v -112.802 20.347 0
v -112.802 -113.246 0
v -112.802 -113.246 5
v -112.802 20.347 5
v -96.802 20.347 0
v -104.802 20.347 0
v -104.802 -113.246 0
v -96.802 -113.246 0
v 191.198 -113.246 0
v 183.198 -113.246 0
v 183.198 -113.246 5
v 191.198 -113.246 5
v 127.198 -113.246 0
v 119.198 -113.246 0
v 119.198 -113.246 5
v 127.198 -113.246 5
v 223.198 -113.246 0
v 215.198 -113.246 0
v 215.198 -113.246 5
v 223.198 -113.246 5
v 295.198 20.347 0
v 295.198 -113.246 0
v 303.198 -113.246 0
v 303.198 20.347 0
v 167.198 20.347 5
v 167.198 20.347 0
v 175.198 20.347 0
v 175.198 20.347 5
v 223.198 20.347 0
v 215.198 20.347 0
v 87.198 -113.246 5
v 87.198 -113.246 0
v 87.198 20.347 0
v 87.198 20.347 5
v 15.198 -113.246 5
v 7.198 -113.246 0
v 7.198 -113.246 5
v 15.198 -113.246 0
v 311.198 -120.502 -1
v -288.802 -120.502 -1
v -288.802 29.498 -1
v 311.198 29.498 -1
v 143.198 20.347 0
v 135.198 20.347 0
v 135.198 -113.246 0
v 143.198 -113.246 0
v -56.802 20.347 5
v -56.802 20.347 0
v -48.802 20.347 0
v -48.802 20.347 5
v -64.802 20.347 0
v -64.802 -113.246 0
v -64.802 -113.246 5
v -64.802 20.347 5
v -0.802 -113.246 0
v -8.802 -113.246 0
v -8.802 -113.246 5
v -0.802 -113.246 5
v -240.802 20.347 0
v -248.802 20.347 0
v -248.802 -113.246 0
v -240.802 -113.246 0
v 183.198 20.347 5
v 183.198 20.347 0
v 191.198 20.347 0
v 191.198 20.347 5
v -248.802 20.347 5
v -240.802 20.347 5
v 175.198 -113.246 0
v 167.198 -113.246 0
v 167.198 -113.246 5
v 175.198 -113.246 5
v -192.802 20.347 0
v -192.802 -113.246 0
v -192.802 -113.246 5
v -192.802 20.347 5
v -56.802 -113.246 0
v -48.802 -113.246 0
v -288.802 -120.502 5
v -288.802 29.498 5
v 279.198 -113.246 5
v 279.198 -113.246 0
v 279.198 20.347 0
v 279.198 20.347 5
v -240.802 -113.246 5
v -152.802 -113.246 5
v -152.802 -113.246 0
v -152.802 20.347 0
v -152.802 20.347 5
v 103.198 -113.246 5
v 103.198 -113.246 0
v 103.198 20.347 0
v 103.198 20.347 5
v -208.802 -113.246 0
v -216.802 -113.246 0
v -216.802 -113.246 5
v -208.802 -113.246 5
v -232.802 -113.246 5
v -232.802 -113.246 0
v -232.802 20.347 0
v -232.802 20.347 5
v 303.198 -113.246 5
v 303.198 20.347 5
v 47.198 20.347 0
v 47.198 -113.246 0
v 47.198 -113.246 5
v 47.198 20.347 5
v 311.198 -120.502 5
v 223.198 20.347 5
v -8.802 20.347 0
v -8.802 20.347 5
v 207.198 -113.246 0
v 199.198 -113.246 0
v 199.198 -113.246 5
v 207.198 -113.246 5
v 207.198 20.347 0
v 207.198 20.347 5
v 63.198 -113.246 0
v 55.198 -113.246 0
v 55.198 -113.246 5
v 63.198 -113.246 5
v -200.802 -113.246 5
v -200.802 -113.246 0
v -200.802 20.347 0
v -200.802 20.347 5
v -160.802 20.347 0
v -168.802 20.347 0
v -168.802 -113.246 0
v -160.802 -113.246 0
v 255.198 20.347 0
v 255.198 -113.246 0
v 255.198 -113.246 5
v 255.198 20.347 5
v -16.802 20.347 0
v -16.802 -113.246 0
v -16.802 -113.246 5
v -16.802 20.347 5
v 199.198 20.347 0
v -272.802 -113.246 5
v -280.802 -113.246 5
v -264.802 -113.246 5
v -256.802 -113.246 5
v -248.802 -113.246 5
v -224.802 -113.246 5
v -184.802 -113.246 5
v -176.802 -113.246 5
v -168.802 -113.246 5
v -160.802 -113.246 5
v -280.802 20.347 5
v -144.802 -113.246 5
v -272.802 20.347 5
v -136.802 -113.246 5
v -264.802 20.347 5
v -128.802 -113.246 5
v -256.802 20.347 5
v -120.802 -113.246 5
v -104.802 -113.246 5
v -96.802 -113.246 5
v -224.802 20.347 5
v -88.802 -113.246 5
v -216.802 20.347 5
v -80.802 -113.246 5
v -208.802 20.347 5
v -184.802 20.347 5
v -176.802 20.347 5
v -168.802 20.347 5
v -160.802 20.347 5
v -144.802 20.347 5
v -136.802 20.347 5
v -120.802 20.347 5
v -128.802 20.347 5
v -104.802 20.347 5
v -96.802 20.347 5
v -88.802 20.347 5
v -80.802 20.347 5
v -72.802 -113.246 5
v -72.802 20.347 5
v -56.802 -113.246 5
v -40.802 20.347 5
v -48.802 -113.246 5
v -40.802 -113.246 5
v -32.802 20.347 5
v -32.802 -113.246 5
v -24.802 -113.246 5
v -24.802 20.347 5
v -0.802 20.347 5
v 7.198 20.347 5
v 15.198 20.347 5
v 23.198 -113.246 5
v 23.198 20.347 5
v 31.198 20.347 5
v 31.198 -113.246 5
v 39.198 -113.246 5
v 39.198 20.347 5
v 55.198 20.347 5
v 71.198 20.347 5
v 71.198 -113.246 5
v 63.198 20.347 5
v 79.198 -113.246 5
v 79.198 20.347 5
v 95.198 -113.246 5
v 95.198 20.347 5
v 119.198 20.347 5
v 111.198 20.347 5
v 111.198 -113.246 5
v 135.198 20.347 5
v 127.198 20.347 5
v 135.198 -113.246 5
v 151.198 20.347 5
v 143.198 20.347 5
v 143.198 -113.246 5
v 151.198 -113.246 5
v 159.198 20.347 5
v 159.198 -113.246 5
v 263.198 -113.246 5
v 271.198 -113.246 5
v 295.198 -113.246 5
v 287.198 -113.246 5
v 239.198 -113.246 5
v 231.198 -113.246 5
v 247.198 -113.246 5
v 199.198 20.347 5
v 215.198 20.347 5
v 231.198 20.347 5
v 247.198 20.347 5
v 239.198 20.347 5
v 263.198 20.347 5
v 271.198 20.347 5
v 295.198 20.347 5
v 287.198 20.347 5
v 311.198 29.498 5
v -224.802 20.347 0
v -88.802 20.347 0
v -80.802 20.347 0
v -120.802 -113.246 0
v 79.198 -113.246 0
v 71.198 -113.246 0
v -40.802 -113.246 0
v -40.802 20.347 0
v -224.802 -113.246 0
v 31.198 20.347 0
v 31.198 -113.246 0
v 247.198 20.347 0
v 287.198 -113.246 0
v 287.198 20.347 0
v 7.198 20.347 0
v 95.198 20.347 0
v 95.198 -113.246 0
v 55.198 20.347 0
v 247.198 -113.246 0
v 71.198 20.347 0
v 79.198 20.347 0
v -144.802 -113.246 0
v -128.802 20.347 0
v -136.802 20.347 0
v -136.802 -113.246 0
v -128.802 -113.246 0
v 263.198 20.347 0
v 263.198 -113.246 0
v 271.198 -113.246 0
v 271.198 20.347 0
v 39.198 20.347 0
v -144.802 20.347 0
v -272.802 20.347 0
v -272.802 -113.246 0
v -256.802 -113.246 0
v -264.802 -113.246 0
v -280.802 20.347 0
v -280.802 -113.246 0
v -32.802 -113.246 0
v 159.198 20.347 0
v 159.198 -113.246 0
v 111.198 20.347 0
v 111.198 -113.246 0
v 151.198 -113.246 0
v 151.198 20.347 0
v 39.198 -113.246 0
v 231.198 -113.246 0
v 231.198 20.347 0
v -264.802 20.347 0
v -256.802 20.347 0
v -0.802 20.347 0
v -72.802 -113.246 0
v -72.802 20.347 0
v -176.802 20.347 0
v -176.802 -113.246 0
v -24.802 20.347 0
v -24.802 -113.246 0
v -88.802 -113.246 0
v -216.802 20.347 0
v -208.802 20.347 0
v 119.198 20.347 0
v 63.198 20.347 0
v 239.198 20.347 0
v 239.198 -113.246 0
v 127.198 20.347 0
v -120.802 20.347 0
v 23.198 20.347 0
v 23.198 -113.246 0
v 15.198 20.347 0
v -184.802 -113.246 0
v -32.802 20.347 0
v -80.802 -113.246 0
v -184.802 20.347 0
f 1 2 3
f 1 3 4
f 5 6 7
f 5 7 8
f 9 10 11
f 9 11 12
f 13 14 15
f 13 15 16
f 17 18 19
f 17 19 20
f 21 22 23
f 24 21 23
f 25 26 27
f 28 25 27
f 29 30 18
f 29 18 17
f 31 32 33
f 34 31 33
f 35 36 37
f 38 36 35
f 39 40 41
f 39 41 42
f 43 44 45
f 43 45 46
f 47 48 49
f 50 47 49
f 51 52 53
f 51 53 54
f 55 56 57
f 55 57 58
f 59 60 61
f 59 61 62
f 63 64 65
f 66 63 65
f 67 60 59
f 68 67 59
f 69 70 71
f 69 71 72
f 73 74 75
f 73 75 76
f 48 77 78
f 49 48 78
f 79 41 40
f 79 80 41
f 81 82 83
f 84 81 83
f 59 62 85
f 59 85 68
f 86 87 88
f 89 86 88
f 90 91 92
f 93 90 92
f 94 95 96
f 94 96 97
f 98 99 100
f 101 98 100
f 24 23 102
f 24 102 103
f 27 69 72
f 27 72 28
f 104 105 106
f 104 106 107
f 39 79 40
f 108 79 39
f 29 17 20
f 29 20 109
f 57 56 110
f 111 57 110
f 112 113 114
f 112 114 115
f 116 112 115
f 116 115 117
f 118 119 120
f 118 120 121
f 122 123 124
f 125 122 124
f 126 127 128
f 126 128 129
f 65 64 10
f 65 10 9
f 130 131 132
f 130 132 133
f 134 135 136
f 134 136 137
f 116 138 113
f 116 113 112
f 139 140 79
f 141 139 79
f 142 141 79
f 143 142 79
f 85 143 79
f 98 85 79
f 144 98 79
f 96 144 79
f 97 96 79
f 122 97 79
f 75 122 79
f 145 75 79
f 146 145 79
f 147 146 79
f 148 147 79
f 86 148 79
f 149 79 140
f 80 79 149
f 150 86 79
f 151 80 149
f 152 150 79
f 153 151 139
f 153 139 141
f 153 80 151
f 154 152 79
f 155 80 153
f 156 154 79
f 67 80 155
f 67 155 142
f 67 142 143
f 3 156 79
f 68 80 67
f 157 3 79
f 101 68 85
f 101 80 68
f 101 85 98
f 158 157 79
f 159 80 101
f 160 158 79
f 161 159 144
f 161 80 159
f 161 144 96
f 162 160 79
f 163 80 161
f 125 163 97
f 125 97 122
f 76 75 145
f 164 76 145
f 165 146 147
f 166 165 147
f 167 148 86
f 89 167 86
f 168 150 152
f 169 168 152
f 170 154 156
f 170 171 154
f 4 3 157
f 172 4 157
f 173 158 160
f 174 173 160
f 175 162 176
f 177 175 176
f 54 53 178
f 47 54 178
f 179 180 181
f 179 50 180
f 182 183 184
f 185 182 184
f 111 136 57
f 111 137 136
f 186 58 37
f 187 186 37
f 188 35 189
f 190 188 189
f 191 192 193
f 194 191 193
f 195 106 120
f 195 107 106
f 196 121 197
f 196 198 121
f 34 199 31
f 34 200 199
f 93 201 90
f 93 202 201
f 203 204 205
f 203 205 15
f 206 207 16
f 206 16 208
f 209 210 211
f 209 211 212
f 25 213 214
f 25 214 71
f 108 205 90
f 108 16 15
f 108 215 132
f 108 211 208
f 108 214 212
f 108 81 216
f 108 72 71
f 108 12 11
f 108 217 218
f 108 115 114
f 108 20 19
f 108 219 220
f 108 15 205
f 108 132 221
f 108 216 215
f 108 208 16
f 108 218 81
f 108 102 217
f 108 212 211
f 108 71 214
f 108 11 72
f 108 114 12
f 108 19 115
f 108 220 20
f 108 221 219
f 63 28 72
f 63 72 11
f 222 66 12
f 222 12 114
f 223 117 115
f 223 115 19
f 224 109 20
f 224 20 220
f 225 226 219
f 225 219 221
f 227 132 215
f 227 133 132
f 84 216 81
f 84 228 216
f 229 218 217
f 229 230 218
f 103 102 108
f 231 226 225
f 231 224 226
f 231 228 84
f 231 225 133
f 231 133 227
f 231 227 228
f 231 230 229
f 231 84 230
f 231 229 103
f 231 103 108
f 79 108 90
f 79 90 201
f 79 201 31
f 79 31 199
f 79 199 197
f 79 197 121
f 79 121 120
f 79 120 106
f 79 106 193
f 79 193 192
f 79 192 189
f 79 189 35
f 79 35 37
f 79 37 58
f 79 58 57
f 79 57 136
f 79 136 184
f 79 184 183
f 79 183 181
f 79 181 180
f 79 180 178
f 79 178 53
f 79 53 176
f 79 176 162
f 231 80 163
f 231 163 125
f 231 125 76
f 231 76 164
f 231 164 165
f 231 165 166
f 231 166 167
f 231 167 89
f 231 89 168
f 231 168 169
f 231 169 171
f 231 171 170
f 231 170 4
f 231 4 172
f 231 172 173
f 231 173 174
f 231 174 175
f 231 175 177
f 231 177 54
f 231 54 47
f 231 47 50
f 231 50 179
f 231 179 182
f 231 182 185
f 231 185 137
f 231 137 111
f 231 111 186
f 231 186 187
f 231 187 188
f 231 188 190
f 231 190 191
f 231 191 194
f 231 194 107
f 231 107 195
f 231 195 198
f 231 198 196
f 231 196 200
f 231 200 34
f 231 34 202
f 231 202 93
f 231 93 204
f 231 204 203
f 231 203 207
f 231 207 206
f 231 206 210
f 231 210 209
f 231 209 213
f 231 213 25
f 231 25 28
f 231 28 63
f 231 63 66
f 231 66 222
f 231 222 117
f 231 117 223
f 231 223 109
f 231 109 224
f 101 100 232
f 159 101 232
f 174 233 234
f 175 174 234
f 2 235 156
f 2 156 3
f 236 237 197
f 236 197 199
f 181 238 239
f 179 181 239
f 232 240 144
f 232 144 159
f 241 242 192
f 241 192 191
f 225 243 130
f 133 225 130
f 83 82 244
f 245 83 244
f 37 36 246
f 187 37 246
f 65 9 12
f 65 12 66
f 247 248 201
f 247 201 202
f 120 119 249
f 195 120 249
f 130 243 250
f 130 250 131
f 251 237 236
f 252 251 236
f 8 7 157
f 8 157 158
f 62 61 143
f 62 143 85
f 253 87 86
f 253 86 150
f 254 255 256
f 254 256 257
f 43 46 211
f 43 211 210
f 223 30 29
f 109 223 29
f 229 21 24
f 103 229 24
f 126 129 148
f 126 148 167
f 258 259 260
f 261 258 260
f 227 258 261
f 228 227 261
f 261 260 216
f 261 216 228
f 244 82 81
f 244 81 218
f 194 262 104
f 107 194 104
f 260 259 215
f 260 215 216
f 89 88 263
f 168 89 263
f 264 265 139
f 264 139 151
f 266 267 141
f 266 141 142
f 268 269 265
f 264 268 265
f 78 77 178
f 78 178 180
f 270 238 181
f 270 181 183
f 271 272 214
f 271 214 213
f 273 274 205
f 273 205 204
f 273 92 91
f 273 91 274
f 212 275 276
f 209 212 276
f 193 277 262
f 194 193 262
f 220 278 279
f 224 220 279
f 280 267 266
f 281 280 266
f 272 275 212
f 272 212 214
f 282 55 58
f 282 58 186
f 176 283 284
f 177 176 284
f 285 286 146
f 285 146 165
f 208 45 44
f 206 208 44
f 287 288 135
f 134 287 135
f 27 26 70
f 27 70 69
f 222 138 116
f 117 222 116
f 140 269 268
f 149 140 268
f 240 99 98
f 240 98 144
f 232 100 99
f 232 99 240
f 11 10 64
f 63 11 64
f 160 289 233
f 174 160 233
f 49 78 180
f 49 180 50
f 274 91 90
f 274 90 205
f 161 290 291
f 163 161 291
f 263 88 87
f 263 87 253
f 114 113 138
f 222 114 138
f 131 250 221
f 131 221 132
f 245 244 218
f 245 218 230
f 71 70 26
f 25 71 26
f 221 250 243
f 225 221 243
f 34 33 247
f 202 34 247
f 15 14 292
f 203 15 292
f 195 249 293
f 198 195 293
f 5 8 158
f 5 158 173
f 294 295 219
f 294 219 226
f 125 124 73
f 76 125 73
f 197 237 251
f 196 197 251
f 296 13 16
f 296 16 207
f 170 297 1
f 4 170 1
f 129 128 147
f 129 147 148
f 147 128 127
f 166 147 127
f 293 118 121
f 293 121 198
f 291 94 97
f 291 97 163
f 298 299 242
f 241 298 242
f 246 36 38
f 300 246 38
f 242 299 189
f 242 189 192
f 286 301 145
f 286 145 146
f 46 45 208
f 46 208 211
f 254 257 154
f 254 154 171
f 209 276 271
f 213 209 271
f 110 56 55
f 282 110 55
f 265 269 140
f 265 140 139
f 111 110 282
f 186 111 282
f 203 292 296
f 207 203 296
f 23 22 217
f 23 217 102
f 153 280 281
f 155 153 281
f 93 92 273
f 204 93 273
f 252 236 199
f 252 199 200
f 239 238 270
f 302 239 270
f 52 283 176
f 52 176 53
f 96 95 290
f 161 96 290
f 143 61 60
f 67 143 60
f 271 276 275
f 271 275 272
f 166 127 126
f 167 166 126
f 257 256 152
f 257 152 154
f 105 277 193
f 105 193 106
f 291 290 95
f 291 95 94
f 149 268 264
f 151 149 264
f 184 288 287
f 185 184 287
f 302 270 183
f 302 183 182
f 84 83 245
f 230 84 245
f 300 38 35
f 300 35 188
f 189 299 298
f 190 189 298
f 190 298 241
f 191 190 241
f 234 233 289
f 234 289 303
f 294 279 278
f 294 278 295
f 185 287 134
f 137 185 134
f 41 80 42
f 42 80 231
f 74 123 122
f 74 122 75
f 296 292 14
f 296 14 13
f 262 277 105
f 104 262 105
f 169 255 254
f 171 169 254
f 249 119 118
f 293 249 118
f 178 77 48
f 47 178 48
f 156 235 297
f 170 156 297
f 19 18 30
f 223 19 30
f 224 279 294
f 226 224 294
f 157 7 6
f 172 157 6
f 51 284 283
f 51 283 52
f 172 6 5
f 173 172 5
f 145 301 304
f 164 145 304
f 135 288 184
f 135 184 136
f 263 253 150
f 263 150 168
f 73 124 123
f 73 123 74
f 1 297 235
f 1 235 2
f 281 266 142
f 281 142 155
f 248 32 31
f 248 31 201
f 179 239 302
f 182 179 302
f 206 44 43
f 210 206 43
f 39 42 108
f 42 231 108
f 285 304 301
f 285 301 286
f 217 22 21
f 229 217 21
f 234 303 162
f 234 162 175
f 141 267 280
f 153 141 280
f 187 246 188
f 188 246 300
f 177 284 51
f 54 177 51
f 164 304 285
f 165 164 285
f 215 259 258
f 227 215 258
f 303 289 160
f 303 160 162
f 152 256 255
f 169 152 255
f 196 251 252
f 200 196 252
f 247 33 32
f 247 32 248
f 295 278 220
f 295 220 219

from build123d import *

# Parameters (mm, degrees)
F0_W     = 600
F0_H     = 150
F0_W_2   = 8
F0_H_2   = 133.593111
F1_DEPTH = 5
F2_W     = 600
F2_H     = 150
F3_DEPTH = 1


with BuildPart() as f1:
    # F0 (on Top) → F1 (new body)
    with BuildSketch(Plane.XY):
        with Locations((11.197913, -45.502181)):
            Rectangle(F0_W, F0_H)
        with Locations((-276.802087, -46.449782)):
            Rectangle(F0_W_2, F0_H_2, mode=Mode.SUBTRACT)
        with Locations((-260.802087, -46.449782)):
            Rectangle(F0_W_2, F0_H_2, mode=Mode.SUBTRACT)
        with Locations((-244.802087, -46.449782)):
            Rectangle(F0_W_2, F0_H_2, mode=Mode.SUBTRACT)
        with Locations((-228.802087, -46.449782)):
            Rectangle(F0_W_2, F0_H_2, mode=Mode.SUBTRACT)
        with Locations((-212.802087, -46.449782)):
            Rectangle(F0_W_2, F0_H_2, mode=Mode.SUBTRACT)
        with Locations((-196.802087, -46.449782)):
            Rectangle(F0_W_2, F0_H_2, mode=Mode.SUBTRACT)
        with Locations((-180.802087, -46.449782)):
            Rectangle(F0_W_2, F0_H_2, mode=Mode.SUBTRACT)
        with Locations((-164.802087, -46.449782)):
            Rectangle(F0_W_2, F0_H_2, mode=Mode.SUBTRACT)
        with Locations((-148.802087, -46.449782)):
            Rectangle(F0_W_2, F0_H_2, mode=Mode.SUBTRACT)
        with Locations((-132.802087, -46.449782)):
            Rectangle(F0_W_2, F0_H_2, mode=Mode.SUBTRACT)
        with Locations((-116.802087, -46.449782)):
            Rectangle(F0_W_2, F0_H_2, mode=Mode.SUBTRACT)
        with Locations((-100.802087, -46.449782)):
            Rectangle(F0_W_2, F0_H_2, mode=Mode.SUBTRACT)
        with Locations((-84.802087, -46.449782)):
            Rectangle(F0_W_2, F0_H_2, mode=Mode.SUBTRACT)
        with Locations((-68.802087, -46.449782)):
            Rectangle(F0_W_2, F0_H_2, mode=Mode.SUBTRACT)
        with Locations((-52.802087, -46.449782)):
            Rectangle(F0_W_2, F0_H_2, mode=Mode.SUBTRACT)
        with Locations((-36.802087, -46.449782)):
            Rectangle(F0_W_2, F0_H_2, mode=Mode.SUBTRACT)
        with Locations((-20.802087, -46.449782)):
            Rectangle(F0_W_2, F0_H_2, mode=Mode.SUBTRACT)
        with Locations((-4.802087, -46.449782)):
            Rectangle(F0_W_2, F0_H_2, mode=Mode.SUBTRACT)
        with Locations((11.197913, -46.449782)):
            Rectangle(F0_W_2, F0_H_2, mode=Mode.SUBTRACT)
        with Locations((27.197913, -46.449782)):
            Rectangle(F0_W_2, F0_H_2, mode=Mode.SUBTRACT)
        with Locations((43.197913, -46.449782)):
            Rectangle(F0_W_2, F0_H_2, mode=Mode.SUBTRACT)
        with Locations((59.197913, -46.449782)):
            Rectangle(F0_W_2, F0_H_2, mode=Mode.SUBTRACT)
        with Locations((75.197913, -46.449782)):
            Rectangle(F0_W_2, F0_H_2, mode=Mode.SUBTRACT)
        with Locations((91.197913, -46.449782)):
            Rectangle(F0_W_2, F0_H_2, mode=Mode.SUBTRACT)
        with Locations((107.197913, -46.449782)):
            Rectangle(F0_W_2, F0_H_2, mode=Mode.SUBTRACT)
        with Locations((123.197913, -46.449782)):
            Rectangle(F0_W_2, F0_H_2, mode=Mode.SUBTRACT)
        with Locations((139.197913, -46.449782)):
            Rectangle(F0_W_2, F0_H_2, mode=Mode.SUBTRACT)
        with Locations((155.197913, -46.449782)):
            Rectangle(F0_W_2, F0_H_2, mode=Mode.SUBTRACT)
        with Locations((171.197913, -46.449782)):
            Rectangle(F0_W_2, F0_H_2, mode=Mode.SUBTRACT)
        with Locations((187.197913, -46.449782)):
            Rectangle(F0_W_2, F0_H_2, mode=Mode.SUBTRACT)
        with Locations((203.197913, -46.449782)):
            Rectangle(F0_W_2, F0_H_2, mode=Mode.SUBTRACT)
        with Locations((219.197913, -46.449782)):
            Rectangle(F0_W_2, F0_H_2, mode=Mode.SUBTRACT)
        with Locations((235.197913, -46.449782)):
            Rectangle(F0_W_2, F0_H_2, mode=Mode.SUBTRACT)
        with Locations((251.197913, -46.449782)):
            Rectangle(F0_W_2, F0_H_2, mode=Mode.SUBTRACT)
        with Locations((267.197913, -46.449782)):
            Rectangle(F0_W_2, F0_H_2, mode=Mode.SUBTRACT)
        with Locations((283.197913, -46.449782)):
            Rectangle(F0_W_2, F0_H_2, mode=Mode.SUBTRACT)
        with Locations((299.197913, -46.449782)):
            Rectangle(F0_W_2, F0_H_2, mode=Mode.SUBTRACT)
    extrude(amount=F1_DEPTH)

    # F2 (on face) → F3 (join)
    with BuildSketch(Plane(origin=(0, 0, 0), x_dir=(1, 0, 0), z_dir=(0, 0, -1))):
        with Locations((11.197913, 45.502181)):
            Rectangle(F2_W, F2_H)
    extrude(amount=F3_DEPTH)


solid = f1.part
